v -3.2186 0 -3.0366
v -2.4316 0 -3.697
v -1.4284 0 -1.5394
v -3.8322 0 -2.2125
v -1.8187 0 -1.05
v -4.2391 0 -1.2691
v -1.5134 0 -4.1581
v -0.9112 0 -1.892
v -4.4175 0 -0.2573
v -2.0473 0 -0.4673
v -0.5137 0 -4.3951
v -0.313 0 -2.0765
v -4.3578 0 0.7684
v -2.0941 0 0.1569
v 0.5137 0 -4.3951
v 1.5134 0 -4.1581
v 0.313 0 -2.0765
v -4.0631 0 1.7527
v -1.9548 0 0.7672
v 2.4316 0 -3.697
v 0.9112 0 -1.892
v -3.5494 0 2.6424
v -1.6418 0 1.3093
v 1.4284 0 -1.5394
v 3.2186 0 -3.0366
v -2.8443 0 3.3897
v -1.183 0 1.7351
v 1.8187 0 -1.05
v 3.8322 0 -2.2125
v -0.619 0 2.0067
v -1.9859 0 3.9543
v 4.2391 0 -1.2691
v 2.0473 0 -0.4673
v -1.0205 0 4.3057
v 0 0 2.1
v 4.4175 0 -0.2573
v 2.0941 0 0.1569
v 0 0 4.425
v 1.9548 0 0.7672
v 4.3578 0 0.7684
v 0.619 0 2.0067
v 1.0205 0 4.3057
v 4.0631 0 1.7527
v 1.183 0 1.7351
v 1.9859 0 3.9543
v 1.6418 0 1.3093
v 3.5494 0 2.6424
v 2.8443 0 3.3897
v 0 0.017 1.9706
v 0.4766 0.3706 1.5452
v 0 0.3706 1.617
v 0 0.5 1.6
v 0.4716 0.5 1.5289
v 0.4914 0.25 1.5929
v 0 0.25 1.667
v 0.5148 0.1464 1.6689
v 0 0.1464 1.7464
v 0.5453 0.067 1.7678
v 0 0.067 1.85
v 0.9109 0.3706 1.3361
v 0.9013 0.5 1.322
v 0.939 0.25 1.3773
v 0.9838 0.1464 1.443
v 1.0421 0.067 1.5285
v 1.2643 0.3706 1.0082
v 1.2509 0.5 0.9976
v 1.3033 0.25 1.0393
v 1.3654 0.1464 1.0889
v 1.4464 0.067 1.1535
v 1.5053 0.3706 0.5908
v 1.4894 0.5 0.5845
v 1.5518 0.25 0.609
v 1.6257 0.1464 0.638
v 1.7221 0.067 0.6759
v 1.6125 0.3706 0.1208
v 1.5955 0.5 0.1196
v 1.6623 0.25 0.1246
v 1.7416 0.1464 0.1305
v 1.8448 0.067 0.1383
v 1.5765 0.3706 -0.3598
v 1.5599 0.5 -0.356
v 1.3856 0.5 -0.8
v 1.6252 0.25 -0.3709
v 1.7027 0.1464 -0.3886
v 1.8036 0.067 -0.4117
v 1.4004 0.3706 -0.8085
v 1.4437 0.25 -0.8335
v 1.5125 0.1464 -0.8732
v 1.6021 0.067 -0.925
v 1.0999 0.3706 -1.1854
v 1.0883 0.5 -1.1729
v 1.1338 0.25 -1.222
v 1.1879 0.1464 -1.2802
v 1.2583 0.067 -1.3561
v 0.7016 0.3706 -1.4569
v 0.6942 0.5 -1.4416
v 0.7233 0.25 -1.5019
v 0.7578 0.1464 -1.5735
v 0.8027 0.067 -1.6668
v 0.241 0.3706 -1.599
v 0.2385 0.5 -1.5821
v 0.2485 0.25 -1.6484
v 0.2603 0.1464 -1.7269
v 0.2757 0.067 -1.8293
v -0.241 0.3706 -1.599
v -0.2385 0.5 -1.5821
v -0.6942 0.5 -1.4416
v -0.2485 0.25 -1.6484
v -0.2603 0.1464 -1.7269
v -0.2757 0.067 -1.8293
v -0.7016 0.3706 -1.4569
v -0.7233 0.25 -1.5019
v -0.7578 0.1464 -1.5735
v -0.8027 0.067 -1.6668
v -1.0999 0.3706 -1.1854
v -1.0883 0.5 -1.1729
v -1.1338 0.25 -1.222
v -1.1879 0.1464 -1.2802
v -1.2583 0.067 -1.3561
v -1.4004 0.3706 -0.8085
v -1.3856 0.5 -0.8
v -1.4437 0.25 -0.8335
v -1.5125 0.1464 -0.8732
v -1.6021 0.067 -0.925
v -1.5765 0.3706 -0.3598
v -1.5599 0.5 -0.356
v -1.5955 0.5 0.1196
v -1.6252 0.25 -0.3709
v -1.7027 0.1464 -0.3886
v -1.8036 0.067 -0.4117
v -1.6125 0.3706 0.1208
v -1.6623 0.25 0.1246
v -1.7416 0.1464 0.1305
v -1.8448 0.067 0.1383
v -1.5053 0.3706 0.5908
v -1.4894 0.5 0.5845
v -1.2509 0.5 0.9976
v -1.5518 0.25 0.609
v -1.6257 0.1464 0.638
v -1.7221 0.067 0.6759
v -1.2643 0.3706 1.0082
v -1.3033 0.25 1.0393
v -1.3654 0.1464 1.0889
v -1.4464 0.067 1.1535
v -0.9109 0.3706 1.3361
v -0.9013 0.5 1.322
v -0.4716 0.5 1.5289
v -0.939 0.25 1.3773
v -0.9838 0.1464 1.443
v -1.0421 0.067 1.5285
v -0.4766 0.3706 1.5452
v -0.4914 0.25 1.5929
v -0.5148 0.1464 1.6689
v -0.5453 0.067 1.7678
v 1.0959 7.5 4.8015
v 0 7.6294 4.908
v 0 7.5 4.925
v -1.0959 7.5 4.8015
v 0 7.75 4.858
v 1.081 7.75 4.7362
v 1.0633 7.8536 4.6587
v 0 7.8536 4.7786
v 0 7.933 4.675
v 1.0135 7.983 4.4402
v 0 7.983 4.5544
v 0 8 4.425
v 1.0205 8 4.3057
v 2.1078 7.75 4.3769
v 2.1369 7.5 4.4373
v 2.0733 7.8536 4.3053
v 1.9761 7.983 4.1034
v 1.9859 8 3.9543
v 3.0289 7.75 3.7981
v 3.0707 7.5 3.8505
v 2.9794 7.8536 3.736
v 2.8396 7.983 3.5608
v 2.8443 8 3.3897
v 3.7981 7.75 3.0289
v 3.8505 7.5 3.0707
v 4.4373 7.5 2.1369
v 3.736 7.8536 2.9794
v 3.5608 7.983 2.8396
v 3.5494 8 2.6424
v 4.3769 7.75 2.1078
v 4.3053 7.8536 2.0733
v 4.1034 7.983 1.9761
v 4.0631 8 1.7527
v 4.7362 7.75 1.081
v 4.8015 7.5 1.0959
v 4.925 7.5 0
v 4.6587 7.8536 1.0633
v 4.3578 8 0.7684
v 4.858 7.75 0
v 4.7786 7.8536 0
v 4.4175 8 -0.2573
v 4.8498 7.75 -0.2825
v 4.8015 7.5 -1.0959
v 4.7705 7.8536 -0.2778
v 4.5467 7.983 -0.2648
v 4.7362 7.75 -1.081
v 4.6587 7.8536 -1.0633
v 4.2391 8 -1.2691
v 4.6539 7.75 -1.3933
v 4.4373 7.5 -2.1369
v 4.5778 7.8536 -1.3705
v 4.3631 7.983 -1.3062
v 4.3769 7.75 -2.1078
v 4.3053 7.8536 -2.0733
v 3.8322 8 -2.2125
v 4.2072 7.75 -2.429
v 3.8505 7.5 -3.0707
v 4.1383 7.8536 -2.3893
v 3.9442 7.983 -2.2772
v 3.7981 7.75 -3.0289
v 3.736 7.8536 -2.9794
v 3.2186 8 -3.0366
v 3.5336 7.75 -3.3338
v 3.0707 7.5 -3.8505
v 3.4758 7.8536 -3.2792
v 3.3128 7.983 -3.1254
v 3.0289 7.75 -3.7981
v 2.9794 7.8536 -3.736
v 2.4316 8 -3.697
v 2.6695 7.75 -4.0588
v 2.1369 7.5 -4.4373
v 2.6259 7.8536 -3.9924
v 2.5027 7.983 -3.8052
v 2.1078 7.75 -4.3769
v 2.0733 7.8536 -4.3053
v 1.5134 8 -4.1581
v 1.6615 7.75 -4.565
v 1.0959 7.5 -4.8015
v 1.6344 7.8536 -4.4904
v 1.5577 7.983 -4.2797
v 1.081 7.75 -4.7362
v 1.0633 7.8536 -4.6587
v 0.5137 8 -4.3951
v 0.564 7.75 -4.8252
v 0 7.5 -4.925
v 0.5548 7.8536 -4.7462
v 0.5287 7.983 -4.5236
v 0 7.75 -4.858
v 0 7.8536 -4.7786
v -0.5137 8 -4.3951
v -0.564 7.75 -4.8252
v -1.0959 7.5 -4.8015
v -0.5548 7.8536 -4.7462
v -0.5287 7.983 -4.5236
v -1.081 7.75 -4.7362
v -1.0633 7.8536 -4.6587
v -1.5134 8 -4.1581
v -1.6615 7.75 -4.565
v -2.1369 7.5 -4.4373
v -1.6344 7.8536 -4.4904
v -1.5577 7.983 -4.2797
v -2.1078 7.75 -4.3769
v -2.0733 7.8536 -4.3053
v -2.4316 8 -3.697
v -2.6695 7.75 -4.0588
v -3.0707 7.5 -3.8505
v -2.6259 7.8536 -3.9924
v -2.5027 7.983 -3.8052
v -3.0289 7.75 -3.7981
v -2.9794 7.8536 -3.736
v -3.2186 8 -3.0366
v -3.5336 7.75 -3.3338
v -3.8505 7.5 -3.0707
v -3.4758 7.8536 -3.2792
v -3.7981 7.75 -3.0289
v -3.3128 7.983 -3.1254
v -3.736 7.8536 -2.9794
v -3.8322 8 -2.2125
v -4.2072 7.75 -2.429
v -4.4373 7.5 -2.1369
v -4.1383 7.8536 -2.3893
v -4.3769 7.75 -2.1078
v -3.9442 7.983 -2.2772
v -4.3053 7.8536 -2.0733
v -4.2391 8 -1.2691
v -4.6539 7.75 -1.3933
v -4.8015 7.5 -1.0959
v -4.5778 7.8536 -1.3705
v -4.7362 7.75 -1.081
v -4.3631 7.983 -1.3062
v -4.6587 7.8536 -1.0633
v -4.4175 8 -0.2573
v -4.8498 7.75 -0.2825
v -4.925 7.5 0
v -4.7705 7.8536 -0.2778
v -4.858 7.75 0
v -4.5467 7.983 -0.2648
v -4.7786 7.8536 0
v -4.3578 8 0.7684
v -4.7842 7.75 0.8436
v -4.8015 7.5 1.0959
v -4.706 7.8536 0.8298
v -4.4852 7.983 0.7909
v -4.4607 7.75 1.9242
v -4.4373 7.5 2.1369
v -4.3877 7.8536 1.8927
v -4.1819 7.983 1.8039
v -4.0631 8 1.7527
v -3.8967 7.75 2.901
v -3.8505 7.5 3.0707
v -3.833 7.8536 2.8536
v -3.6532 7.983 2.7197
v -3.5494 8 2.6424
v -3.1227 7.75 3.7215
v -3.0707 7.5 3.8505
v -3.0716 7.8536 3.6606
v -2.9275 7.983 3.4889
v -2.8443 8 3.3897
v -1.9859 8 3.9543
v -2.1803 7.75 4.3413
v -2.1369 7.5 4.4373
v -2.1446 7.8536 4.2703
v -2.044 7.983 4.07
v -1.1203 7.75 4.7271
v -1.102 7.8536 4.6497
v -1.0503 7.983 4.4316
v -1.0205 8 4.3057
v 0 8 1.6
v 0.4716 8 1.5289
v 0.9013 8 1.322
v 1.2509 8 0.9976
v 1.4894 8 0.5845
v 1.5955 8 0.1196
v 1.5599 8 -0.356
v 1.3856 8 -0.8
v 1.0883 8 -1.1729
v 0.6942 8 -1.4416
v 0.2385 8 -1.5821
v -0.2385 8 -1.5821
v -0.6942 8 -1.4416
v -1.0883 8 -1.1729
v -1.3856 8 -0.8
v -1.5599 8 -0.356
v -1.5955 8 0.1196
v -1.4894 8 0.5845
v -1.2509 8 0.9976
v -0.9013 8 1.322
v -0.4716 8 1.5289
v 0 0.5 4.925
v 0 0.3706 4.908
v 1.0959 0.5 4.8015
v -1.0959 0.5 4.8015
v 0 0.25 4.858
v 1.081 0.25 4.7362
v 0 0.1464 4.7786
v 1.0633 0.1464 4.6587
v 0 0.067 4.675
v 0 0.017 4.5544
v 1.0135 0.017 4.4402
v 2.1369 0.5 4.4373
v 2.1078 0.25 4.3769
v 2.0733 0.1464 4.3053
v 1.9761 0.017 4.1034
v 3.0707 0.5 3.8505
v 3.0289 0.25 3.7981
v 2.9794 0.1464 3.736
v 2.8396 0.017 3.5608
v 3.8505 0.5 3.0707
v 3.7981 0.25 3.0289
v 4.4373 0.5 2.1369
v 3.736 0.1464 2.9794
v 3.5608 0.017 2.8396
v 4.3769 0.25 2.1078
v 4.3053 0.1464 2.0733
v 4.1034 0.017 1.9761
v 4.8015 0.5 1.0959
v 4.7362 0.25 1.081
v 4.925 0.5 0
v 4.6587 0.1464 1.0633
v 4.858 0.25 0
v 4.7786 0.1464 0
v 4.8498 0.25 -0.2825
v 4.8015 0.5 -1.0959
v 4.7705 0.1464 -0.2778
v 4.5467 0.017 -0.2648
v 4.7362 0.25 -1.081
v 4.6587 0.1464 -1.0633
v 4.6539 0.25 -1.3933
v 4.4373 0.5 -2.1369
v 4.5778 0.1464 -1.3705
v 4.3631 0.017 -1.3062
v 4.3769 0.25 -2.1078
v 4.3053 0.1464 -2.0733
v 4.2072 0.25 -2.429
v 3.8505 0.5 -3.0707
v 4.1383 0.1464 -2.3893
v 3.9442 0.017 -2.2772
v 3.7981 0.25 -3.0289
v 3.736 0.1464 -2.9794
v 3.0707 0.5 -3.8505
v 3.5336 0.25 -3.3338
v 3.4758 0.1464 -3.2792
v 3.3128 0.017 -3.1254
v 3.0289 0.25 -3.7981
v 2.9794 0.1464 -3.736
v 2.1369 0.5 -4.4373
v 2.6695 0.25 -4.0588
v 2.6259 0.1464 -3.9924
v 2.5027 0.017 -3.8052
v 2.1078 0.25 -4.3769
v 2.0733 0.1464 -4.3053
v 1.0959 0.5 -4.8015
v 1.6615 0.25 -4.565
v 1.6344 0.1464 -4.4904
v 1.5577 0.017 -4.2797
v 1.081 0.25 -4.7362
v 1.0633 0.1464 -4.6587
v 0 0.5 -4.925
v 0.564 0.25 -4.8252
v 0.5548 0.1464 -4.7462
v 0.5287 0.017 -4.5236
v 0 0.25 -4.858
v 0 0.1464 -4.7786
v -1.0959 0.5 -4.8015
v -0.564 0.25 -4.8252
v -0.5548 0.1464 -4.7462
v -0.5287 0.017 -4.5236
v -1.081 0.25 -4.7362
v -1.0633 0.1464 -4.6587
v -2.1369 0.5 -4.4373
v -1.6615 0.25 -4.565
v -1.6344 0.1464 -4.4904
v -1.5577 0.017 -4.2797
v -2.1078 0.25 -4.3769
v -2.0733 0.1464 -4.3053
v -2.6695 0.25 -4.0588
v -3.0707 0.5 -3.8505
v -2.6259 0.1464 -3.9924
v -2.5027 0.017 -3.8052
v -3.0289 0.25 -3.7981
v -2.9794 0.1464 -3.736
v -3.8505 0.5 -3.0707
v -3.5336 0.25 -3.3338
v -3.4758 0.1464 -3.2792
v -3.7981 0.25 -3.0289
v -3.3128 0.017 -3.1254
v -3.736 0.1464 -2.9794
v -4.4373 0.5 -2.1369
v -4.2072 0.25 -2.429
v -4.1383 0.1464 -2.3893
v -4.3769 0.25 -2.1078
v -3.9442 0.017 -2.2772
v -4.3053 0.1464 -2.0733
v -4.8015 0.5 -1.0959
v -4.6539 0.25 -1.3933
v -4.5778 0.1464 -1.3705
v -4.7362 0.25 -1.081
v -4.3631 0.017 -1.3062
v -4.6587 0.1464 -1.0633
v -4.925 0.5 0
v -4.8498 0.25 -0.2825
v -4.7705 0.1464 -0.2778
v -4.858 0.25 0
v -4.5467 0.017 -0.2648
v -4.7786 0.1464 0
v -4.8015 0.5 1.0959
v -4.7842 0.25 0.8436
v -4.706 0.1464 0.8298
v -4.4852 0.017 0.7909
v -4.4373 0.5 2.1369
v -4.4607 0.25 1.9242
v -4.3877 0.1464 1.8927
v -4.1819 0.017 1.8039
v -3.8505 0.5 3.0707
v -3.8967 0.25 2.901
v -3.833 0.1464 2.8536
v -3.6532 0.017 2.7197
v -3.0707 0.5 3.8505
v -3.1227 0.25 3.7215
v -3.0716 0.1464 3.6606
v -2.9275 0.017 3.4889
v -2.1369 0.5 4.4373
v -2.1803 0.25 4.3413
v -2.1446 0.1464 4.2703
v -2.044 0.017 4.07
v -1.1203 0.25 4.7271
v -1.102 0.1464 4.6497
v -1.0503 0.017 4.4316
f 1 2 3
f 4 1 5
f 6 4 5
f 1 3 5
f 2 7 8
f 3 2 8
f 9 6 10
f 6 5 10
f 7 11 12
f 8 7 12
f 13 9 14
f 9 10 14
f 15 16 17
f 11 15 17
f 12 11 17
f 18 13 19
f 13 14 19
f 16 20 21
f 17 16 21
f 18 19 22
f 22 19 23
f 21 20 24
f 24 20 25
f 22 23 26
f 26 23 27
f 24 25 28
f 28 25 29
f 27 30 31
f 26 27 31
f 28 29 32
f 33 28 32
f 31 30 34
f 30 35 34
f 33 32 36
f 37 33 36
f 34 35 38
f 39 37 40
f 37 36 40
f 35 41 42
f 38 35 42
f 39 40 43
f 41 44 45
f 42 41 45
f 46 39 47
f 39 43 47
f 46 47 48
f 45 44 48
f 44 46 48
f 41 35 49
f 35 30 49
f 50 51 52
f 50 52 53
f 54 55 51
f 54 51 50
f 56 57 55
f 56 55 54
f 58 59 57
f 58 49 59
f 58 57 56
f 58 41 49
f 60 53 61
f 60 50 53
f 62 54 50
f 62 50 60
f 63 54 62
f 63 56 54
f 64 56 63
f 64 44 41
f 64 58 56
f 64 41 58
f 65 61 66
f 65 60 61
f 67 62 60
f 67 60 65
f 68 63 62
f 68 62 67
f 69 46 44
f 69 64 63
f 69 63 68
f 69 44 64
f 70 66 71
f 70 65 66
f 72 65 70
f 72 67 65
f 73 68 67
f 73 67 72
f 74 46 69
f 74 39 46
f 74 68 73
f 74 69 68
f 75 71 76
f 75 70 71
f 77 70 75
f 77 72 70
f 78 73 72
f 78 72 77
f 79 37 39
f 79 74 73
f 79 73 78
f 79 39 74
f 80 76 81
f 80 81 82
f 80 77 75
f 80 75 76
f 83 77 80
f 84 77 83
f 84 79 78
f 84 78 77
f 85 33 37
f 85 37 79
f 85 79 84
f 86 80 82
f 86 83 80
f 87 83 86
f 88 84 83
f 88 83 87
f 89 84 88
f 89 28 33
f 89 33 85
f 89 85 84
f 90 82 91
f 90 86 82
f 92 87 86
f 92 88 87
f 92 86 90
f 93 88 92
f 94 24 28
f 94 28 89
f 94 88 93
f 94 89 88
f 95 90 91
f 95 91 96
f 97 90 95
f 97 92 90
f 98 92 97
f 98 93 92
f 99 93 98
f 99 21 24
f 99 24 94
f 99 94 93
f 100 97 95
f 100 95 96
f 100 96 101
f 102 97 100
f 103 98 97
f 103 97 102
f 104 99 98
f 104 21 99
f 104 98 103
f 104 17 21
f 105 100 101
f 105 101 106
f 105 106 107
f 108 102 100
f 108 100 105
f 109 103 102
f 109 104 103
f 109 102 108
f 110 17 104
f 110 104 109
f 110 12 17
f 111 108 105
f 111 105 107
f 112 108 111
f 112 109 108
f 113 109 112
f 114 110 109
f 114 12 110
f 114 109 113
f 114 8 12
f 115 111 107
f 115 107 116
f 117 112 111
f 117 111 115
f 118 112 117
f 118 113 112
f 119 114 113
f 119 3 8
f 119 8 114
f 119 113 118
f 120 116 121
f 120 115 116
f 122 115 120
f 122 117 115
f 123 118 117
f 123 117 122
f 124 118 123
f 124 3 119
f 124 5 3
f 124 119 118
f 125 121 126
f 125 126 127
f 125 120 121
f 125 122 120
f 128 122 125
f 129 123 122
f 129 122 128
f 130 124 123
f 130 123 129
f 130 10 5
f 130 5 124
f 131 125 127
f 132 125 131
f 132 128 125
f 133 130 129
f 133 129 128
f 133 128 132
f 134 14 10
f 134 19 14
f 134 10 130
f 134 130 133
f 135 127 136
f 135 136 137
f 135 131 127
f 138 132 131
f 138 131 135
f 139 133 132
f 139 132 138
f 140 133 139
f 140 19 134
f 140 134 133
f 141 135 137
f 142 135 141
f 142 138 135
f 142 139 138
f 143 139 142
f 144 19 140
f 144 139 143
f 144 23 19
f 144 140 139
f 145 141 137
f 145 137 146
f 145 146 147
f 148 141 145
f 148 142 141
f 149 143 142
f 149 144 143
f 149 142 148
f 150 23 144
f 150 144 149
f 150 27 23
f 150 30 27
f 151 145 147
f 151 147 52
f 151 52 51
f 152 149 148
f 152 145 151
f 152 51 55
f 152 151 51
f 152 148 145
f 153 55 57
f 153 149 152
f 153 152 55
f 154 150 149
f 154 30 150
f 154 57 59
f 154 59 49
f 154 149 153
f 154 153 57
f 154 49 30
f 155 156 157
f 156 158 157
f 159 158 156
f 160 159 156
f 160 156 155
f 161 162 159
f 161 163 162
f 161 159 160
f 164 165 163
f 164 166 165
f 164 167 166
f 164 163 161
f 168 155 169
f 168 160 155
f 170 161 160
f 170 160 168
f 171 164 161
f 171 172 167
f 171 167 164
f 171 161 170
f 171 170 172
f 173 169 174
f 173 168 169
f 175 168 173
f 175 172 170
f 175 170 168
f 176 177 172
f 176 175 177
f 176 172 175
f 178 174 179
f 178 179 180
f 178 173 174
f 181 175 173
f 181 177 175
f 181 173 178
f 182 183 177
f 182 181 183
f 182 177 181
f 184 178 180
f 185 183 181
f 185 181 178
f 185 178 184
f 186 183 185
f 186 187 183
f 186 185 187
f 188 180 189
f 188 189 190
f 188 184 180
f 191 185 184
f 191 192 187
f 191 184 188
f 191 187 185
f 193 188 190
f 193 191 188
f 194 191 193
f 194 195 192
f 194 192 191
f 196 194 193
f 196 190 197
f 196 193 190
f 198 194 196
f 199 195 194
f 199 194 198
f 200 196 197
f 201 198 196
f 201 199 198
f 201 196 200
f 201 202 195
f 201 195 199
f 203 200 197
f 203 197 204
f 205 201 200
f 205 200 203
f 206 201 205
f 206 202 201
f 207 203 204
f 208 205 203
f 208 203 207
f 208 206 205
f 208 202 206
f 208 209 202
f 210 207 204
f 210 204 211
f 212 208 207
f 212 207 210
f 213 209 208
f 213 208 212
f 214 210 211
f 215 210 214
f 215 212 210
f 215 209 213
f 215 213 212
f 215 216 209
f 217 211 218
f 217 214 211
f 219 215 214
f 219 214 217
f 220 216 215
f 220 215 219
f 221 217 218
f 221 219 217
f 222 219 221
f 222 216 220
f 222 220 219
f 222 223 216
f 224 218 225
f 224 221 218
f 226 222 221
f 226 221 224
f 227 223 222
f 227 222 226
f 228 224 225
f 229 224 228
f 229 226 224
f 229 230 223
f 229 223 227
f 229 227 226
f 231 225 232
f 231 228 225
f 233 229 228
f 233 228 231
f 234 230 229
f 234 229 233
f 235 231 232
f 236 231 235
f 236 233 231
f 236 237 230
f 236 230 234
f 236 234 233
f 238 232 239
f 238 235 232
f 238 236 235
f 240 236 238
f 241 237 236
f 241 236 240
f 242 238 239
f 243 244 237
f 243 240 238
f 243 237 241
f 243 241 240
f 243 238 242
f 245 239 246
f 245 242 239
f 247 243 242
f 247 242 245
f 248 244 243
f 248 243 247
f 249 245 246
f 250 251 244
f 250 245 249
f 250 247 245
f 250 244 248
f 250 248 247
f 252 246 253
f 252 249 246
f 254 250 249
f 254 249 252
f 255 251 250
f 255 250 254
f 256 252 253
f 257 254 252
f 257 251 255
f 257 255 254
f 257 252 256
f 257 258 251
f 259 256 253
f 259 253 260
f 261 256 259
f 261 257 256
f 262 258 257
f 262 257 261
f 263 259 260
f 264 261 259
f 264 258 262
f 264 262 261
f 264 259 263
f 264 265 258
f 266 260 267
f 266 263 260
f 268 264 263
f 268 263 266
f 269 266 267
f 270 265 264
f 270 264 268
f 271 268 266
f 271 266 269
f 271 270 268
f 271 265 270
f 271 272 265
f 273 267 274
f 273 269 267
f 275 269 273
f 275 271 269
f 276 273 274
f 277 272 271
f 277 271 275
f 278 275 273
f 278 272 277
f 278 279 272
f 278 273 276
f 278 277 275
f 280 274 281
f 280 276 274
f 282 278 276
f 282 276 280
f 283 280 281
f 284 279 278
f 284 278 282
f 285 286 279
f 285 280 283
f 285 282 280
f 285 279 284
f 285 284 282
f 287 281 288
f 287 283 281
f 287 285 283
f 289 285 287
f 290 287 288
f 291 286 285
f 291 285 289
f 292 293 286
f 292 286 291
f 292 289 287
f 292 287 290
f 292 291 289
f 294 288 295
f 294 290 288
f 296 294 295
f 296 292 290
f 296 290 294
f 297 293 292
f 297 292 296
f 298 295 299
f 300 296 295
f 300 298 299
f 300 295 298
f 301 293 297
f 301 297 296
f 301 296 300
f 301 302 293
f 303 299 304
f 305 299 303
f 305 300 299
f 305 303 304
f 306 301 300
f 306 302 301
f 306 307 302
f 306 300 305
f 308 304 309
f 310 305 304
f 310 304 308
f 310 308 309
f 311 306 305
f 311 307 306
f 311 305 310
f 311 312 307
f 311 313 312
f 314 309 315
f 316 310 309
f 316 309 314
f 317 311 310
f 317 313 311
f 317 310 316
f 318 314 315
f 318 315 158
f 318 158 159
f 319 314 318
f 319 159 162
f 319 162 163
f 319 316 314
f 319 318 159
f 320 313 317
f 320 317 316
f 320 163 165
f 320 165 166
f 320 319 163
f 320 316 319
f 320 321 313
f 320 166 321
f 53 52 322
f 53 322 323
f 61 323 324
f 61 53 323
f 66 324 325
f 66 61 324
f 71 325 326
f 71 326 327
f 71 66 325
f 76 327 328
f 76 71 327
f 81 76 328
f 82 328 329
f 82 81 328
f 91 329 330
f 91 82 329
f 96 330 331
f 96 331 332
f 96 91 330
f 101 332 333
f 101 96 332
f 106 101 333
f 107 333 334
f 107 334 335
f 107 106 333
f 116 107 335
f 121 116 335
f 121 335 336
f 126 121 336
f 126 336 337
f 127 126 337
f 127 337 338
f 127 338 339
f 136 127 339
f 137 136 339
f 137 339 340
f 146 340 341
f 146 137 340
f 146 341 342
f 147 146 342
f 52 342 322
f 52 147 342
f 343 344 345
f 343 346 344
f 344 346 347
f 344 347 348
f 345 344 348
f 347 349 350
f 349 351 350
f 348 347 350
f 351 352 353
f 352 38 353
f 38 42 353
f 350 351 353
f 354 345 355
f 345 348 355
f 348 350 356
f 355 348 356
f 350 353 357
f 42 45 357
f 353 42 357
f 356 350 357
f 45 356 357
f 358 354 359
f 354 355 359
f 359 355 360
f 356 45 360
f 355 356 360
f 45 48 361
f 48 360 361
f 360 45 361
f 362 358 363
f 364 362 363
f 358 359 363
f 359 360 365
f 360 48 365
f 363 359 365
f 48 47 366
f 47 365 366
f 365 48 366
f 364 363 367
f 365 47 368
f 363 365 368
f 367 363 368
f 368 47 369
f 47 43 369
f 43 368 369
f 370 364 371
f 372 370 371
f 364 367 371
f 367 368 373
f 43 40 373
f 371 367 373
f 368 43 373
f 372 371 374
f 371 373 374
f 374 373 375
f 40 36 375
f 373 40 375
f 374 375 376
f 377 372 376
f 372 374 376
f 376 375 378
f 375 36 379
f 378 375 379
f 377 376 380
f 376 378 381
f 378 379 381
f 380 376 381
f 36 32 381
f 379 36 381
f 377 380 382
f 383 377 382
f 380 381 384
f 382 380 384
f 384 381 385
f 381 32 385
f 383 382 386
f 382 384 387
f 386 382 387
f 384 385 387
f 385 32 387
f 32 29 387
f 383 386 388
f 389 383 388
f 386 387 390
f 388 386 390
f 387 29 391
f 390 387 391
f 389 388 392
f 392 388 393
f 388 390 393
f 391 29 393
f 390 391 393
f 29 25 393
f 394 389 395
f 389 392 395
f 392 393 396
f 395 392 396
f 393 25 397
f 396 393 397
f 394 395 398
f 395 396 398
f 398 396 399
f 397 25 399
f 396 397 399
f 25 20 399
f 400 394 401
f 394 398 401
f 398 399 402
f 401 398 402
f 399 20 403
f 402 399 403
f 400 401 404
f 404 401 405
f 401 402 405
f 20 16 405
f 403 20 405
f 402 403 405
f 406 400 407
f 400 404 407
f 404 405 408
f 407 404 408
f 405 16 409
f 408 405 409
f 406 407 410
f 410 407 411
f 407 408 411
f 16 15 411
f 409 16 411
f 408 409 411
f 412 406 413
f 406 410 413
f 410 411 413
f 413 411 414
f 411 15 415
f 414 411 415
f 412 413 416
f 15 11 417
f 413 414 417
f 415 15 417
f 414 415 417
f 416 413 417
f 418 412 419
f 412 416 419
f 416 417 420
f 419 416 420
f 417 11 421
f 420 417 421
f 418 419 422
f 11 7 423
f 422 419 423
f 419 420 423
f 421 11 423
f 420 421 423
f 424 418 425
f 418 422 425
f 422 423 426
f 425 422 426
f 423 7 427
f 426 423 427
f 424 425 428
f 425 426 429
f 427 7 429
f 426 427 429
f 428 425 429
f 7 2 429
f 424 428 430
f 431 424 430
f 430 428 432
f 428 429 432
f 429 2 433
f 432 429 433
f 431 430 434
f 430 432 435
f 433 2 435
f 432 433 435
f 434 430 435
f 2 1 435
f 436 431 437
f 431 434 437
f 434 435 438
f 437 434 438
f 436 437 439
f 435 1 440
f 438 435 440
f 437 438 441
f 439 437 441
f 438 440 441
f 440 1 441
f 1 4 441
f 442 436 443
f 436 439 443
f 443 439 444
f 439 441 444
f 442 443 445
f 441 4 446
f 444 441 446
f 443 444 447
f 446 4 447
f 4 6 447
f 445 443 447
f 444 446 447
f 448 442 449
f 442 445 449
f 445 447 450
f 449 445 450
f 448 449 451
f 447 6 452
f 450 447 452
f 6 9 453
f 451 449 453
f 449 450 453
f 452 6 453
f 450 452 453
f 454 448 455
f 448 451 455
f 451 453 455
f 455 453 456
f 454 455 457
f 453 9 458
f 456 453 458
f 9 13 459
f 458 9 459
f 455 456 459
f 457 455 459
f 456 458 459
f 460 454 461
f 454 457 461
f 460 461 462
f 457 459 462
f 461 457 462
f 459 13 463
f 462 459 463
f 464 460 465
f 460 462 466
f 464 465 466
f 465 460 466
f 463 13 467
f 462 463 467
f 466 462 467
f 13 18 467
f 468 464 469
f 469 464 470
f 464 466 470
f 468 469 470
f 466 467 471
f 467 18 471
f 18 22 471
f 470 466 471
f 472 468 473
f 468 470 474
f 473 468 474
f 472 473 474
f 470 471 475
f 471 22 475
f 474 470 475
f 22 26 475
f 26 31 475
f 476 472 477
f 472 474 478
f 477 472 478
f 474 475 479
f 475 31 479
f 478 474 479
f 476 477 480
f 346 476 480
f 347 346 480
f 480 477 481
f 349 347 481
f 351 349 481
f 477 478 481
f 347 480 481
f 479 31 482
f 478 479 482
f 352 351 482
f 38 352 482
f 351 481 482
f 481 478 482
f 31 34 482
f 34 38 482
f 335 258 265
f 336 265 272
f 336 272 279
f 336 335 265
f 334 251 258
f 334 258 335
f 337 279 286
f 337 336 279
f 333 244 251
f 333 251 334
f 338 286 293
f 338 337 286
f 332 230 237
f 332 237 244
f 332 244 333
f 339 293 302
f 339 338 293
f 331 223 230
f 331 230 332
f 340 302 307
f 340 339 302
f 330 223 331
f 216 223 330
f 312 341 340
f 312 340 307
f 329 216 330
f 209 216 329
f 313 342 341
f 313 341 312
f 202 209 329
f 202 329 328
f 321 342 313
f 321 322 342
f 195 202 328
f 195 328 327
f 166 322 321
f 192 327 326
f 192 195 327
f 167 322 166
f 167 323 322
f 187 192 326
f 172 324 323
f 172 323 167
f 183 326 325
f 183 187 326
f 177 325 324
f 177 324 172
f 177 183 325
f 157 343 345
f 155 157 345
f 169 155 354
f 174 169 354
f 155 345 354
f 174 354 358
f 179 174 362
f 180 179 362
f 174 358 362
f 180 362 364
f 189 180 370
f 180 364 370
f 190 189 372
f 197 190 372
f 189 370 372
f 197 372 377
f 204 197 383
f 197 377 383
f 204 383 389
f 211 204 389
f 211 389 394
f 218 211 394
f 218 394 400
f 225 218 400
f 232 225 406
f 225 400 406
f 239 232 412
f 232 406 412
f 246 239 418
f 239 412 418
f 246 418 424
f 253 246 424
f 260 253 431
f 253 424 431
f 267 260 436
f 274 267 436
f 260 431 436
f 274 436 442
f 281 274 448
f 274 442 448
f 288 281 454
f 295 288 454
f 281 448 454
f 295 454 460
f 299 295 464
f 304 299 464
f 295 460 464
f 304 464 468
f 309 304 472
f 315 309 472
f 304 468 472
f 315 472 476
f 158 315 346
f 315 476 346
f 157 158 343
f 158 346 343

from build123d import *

# Parameters (mm, degrees)
SKETCH_1_R      = 4.925
SKETCH_1_R_2    = 1.6
EXTRUDE_1_DEPTH = 8
FILLET_1_R      = 0.5


with BuildPart() as part:
    # 草图1 → 凸台-拉伸1 (new body)
    with BuildSketch(Plane(origin=(0, 0, 0), x_dir=(1, 0, 0), z_dir=(0, 1, 0))):
        with Locations(Location((0, 0, 0), (0, 0, 270))):
            Circle(SKETCH_1_R)
        with Locations(Location((0, 0, 0), (0, 0, 270))):
            Circle(SKETCH_1_R_2, mode=Mode.SUBTRACT)
    extrude(amount=EXTRUDE_1_DEPTH)

    # 圆角1
    fillet_1_edges = [part.edges().sort_by_distance(p)[0] for p in [
        (0, 0, -4.925),
        (0, 8, -4.925),
        (0, 0, -1.6),
    ]]
    fillet(fillet_1_edges, radius=FILLET_1_R)


solid = part.part
